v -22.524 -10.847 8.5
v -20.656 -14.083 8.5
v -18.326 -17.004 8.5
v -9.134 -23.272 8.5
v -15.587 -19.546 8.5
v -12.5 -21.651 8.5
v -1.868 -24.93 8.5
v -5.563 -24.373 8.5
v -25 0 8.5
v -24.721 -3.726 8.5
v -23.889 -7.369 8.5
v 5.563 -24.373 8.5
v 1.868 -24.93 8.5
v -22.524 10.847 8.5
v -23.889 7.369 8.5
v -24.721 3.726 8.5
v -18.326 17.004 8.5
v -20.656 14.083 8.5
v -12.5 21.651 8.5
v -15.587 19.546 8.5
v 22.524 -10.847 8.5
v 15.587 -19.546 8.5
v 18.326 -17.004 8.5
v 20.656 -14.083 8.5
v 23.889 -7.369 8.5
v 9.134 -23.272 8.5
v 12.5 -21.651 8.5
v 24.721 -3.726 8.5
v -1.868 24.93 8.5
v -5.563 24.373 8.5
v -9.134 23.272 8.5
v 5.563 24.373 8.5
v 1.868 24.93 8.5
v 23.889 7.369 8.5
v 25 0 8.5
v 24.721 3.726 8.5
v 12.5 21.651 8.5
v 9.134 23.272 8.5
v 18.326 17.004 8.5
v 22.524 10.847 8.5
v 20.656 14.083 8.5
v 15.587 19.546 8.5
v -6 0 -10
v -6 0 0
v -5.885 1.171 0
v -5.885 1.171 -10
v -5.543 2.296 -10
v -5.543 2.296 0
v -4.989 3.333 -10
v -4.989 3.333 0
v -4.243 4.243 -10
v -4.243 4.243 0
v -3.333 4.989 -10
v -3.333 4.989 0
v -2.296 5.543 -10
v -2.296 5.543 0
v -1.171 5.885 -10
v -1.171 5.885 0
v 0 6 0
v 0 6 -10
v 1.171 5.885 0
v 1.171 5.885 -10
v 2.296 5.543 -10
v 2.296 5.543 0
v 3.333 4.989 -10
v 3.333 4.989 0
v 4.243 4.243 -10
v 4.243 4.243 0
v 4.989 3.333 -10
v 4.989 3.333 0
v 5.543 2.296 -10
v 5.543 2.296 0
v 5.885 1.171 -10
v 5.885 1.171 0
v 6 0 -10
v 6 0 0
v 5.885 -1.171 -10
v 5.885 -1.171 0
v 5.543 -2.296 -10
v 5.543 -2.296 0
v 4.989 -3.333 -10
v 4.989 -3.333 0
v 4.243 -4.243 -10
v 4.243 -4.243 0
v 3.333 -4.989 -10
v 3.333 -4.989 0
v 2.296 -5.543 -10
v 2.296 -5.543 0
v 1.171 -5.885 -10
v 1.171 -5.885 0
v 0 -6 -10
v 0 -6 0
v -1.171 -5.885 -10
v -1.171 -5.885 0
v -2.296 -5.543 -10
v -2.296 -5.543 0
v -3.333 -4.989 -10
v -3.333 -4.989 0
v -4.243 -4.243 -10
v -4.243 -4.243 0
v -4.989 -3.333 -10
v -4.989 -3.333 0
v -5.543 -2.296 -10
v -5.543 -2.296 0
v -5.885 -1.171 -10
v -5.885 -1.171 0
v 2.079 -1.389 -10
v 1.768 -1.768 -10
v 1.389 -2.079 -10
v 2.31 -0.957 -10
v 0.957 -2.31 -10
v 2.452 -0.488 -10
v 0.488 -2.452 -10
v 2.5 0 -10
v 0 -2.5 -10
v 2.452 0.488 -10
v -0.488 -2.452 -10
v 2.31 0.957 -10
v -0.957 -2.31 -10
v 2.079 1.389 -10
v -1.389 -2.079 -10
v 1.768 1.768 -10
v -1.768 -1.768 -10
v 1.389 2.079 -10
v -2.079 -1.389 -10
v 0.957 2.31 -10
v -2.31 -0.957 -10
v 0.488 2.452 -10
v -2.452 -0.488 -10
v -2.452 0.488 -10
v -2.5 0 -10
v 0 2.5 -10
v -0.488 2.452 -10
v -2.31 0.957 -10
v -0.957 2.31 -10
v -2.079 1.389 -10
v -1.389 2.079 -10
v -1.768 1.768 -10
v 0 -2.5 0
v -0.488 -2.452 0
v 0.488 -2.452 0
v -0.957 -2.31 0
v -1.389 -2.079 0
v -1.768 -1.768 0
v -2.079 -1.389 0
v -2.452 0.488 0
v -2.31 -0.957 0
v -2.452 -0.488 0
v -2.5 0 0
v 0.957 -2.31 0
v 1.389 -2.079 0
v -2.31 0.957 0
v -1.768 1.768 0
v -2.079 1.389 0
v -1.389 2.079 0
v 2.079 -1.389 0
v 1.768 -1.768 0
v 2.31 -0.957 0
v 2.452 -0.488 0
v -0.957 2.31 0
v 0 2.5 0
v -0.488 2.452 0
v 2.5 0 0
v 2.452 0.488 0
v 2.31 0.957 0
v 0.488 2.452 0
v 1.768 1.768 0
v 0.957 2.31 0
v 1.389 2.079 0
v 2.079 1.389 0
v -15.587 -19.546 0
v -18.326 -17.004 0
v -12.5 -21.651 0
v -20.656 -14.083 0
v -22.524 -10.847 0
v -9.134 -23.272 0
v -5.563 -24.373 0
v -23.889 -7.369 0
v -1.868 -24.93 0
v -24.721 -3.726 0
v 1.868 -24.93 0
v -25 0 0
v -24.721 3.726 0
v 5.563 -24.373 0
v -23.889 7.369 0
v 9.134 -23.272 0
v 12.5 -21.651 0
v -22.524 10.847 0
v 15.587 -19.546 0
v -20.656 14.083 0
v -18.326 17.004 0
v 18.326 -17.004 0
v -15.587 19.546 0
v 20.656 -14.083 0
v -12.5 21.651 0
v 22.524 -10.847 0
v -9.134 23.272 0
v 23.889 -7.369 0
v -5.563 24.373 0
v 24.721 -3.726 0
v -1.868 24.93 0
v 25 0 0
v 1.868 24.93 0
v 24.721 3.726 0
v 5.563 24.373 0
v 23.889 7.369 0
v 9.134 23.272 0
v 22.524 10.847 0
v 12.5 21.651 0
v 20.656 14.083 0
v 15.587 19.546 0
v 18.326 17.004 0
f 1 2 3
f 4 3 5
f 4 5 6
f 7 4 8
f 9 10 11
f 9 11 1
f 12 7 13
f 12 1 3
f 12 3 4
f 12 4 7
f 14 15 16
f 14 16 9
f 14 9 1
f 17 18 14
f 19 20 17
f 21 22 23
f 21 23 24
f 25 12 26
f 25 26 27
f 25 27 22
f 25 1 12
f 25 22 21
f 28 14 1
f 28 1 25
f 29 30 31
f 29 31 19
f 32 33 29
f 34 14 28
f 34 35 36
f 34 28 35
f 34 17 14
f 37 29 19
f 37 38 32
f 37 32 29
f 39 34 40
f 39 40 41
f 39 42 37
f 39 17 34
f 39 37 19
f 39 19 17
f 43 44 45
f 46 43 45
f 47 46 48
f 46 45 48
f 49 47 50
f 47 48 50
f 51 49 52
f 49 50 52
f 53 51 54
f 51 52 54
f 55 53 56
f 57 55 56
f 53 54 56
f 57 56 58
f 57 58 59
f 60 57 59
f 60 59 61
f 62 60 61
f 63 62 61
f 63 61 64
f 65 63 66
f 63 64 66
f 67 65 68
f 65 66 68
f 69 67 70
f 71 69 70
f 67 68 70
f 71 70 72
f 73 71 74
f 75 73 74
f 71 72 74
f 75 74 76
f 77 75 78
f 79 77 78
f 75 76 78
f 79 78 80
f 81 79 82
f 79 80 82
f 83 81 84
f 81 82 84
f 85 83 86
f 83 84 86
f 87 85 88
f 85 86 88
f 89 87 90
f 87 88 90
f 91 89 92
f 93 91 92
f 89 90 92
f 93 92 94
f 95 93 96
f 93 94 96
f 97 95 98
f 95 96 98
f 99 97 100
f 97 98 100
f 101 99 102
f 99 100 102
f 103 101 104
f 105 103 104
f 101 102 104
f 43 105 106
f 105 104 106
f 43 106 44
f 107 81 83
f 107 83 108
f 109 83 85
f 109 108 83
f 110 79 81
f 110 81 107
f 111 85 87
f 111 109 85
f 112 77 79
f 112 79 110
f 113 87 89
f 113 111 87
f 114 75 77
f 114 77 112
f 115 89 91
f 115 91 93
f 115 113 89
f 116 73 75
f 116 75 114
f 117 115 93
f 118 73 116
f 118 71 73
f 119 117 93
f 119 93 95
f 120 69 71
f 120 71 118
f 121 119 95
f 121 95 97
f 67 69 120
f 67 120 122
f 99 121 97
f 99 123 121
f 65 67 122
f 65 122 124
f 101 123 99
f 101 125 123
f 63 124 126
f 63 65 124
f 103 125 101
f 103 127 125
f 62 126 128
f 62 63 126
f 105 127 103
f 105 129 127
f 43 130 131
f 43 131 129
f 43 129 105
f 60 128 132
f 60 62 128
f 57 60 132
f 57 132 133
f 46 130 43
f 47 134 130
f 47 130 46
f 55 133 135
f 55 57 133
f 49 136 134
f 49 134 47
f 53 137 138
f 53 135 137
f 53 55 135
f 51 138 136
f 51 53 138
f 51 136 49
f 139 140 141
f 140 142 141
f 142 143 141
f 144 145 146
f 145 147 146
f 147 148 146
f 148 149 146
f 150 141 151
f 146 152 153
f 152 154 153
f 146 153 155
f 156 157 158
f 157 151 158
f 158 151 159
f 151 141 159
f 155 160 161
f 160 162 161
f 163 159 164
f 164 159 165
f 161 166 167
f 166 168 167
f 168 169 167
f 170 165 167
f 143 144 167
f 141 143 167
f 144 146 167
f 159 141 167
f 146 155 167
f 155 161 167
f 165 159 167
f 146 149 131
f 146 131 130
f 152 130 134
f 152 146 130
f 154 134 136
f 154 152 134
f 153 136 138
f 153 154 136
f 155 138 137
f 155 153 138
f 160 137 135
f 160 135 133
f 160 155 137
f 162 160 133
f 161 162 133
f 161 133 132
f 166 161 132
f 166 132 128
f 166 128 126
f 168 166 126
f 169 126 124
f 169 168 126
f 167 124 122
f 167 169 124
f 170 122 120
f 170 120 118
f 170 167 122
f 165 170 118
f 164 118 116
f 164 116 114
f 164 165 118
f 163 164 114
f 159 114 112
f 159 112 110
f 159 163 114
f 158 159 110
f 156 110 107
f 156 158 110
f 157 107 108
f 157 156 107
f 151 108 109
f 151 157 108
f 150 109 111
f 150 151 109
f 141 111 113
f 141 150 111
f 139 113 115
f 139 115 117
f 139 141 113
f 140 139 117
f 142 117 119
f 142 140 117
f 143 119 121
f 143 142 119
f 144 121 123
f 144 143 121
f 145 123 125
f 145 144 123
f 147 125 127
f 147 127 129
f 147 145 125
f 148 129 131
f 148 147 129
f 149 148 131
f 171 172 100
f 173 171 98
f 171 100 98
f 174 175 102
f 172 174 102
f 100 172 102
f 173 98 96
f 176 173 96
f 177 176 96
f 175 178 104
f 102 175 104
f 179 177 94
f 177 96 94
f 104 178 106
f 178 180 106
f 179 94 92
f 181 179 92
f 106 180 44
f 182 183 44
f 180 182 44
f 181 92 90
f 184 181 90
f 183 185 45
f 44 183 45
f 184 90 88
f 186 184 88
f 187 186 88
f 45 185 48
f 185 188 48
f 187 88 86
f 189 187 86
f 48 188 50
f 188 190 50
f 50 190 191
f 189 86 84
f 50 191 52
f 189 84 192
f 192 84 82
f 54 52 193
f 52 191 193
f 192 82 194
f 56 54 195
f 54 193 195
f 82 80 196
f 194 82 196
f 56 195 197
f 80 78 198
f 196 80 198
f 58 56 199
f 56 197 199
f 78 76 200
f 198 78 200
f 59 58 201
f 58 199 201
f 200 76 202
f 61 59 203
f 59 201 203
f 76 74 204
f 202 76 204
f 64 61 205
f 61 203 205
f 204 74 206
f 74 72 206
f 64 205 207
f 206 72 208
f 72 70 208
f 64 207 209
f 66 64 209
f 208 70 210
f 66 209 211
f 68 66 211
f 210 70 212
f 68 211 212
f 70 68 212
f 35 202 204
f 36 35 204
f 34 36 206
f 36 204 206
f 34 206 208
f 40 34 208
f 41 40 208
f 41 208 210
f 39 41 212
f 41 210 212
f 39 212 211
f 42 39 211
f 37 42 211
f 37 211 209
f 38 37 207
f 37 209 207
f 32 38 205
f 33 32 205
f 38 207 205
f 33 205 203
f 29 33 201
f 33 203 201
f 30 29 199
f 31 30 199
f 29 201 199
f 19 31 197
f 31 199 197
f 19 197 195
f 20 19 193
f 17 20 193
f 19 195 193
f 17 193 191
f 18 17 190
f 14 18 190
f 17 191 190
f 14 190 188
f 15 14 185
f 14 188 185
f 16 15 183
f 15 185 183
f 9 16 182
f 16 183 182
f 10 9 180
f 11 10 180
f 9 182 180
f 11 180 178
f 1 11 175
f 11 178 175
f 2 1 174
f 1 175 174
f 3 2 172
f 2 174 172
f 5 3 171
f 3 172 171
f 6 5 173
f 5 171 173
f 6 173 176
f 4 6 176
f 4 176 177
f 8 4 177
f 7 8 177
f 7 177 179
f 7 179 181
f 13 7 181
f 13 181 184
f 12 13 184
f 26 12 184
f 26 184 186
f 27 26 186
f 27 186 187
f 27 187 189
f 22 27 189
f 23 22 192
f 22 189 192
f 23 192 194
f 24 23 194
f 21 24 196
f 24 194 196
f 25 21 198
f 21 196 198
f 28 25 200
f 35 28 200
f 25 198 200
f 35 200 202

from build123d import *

# Parameters (mm, degrees)
SKETCH1_R           = 25
BOSS_EXTRUDE1_DEPTH = 8.5
SKETCH2_R           = 6
SKETCH2_R_2         = 2.5
BOSS_EXTRUDE2_DEPTH = 10


with BuildPart() as part:
    # Sketch1 → Boss-Extrude1 (new body)
    with BuildSketch(Plane.XY):
        Circle(SKETCH1_R)
    extrude(amount=BOSS_EXTRUDE1_DEPTH)

    # Sketch2 → Boss-Extrude2 (add)
    with BuildSketch(Plane(origin=(0, 0, 0), x_dir=(-1, 0, 0), z_dir=(0, 0, -1))):
        Circle(SKETCH2_R)
        Circle(SKETCH2_R_2, mode=Mode.SUBTRACT)
    extrude(amount=BOSS_EXTRUDE2_DEPTH)


solid = part.part
